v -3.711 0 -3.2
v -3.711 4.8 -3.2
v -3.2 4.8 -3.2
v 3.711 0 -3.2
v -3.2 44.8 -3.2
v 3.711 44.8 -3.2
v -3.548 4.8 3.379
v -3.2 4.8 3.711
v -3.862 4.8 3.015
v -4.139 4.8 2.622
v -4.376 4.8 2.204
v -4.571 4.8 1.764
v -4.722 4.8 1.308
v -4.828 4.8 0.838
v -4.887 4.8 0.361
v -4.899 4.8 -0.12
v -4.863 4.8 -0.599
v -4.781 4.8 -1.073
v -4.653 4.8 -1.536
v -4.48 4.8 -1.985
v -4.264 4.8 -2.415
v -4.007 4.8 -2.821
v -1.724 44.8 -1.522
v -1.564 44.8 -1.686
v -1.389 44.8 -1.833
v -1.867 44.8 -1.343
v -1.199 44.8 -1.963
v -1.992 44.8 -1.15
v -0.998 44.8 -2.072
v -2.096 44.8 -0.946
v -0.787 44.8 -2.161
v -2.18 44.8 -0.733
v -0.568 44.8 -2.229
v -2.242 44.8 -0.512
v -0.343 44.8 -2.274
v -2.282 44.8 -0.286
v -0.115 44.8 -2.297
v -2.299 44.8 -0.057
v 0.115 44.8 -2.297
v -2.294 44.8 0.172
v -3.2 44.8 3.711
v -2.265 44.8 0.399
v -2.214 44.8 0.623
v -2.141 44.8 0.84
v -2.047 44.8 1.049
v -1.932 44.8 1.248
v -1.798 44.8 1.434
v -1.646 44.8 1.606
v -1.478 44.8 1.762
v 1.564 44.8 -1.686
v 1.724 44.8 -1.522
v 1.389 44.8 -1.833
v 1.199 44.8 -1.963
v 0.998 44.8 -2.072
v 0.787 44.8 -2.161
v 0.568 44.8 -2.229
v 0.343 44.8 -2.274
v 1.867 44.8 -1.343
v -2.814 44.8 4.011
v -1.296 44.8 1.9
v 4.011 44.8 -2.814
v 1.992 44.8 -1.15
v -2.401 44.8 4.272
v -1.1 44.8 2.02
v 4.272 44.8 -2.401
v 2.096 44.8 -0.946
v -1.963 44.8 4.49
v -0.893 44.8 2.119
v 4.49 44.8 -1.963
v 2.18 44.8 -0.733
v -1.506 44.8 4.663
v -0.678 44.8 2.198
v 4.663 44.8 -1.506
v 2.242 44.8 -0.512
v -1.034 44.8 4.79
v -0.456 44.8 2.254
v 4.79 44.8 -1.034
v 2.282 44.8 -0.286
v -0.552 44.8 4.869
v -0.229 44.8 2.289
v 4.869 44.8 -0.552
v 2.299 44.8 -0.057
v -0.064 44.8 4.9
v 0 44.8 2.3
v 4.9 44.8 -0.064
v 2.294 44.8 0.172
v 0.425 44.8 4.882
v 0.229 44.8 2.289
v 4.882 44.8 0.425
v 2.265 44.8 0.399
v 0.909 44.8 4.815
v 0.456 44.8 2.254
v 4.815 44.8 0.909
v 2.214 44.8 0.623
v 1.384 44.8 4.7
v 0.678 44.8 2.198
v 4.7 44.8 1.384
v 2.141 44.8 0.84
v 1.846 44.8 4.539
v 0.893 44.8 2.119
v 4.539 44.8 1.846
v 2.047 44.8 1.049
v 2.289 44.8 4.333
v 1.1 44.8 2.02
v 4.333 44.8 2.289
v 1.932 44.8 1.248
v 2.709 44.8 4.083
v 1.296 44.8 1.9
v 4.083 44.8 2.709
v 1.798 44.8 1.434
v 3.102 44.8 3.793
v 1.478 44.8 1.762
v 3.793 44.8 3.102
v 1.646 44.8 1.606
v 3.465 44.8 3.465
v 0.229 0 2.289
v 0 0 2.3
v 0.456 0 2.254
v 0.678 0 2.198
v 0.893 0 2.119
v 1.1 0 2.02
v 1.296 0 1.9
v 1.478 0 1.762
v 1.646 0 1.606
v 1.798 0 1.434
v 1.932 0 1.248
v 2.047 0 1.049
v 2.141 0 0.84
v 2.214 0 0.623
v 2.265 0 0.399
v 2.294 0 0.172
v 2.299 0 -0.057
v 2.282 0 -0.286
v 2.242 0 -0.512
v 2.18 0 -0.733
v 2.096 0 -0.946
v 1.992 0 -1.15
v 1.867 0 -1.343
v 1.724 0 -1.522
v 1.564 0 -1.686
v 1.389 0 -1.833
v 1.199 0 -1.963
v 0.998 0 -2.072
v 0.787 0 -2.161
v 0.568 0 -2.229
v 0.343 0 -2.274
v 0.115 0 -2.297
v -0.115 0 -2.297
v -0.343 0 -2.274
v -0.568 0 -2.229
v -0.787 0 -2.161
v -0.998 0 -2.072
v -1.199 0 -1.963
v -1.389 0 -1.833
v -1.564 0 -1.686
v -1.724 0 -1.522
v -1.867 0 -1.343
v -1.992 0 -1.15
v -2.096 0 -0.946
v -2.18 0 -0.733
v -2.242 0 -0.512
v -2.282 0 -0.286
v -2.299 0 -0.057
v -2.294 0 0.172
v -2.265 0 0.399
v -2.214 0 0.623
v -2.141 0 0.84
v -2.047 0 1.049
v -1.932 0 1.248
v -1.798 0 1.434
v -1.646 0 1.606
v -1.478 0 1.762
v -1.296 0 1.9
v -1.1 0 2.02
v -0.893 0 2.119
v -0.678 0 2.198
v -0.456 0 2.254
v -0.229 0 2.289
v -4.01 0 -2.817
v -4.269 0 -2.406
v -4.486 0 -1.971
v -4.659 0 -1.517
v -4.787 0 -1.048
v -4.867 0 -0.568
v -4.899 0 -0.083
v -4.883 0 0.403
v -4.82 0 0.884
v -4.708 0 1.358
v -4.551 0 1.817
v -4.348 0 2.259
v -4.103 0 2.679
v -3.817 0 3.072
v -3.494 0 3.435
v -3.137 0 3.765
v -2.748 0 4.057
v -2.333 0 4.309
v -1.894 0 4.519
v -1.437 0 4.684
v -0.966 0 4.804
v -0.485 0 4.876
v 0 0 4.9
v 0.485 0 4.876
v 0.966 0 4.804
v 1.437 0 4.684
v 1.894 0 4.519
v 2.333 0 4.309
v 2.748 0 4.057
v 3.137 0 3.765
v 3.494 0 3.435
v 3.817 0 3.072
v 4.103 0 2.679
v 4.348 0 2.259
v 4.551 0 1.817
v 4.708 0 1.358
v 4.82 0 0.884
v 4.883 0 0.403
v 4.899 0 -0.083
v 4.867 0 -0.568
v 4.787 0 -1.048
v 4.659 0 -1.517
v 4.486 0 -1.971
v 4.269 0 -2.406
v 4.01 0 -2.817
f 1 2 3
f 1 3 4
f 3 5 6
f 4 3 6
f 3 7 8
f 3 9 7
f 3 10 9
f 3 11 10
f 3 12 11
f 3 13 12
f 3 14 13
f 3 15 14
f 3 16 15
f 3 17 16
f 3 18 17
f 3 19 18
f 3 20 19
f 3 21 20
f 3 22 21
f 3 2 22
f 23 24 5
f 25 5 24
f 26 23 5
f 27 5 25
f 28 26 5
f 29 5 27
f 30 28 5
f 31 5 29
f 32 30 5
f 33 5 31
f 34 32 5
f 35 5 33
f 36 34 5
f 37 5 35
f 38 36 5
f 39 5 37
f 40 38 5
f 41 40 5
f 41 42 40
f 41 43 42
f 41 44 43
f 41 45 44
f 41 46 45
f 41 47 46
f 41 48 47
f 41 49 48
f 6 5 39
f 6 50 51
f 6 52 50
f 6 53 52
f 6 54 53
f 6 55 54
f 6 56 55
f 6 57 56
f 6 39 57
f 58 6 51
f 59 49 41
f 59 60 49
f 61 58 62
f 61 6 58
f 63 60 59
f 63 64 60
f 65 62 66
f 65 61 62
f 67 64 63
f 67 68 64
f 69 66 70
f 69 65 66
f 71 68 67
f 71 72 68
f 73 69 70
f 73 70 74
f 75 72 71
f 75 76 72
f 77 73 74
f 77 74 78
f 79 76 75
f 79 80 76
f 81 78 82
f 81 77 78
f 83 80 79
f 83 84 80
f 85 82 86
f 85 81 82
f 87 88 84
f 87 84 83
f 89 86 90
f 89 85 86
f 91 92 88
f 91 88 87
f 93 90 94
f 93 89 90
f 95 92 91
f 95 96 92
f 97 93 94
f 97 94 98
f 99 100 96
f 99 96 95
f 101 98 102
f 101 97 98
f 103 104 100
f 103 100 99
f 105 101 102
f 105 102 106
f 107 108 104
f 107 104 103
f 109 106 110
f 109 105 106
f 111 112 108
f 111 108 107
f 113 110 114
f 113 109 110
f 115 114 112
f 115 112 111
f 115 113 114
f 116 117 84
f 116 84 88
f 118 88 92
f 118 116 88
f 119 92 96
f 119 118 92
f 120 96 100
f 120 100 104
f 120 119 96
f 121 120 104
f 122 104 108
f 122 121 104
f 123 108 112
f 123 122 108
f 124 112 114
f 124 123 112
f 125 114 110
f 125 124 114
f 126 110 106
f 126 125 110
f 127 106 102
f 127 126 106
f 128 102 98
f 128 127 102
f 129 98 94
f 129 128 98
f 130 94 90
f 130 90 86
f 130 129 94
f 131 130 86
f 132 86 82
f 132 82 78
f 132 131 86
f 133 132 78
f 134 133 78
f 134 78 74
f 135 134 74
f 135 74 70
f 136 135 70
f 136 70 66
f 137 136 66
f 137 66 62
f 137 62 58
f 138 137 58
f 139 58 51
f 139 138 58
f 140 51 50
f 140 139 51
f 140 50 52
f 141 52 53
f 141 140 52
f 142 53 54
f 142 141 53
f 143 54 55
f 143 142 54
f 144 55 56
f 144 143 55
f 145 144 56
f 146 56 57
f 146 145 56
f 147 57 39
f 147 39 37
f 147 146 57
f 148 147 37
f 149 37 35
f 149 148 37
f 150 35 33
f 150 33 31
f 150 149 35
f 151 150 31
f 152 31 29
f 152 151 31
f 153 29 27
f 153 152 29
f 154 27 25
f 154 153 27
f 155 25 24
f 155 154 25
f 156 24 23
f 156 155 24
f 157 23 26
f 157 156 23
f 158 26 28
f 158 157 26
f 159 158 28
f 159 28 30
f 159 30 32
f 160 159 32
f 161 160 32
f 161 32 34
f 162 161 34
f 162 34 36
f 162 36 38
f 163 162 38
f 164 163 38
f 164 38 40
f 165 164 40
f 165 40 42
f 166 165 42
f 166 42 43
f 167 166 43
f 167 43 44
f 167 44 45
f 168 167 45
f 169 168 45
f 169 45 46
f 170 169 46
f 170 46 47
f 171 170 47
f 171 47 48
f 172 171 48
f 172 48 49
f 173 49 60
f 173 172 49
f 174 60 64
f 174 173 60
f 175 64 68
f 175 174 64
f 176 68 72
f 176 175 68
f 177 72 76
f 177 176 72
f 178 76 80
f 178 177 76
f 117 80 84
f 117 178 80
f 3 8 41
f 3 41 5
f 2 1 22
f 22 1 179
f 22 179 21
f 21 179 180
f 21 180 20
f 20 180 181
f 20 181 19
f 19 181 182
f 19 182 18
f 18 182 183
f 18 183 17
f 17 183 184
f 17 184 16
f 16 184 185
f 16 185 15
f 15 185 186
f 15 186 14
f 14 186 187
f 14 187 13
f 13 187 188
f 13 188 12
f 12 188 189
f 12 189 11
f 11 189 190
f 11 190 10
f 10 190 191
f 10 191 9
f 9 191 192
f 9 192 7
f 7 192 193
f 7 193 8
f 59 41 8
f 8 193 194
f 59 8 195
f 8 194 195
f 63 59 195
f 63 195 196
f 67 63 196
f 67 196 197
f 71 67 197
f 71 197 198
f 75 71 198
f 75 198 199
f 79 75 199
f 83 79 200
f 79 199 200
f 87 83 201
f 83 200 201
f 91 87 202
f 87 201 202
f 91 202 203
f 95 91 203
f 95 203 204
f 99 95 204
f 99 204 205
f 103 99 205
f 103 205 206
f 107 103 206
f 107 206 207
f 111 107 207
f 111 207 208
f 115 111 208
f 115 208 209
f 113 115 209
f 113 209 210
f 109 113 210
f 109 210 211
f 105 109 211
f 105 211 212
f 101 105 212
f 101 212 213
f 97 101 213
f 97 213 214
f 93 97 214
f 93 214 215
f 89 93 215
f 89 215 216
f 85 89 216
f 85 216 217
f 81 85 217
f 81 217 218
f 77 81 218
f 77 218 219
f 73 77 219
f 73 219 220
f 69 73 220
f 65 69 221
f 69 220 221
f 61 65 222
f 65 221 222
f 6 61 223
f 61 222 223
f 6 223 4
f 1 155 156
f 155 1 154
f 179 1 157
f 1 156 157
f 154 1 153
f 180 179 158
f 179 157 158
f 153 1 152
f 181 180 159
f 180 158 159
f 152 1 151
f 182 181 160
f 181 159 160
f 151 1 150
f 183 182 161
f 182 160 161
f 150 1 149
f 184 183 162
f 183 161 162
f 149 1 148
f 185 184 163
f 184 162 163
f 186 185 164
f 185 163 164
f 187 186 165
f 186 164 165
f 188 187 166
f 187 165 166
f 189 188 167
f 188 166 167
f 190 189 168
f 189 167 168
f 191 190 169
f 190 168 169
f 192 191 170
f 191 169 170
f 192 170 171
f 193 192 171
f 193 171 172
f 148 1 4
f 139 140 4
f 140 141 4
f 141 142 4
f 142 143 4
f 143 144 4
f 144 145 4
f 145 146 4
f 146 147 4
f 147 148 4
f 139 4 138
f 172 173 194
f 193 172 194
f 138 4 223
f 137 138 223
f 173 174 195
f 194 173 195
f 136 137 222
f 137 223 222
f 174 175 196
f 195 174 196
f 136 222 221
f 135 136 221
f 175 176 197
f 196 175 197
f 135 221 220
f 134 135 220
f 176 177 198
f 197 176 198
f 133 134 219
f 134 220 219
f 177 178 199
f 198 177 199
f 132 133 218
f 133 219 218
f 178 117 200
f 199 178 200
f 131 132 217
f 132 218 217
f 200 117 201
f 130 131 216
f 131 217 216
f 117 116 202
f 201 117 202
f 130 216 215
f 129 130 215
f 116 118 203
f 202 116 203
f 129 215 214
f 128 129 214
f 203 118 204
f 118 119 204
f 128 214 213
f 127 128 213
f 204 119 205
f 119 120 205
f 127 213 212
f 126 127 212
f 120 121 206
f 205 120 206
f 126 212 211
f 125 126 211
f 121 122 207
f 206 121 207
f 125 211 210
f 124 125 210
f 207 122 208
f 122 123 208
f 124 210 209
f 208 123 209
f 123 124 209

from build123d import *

# Parameters (mm, degrees)
SKETCH1_R           = 4.9
SKETCH1_R_2         = 2.3
BOSS_EXTRUDE1_DEPTH = 44.8
SKETCH2_W           = 12.911728521
SKETCH2_H           = 2.871421643
CUT_EXTRUDE1_DEPTH  = 45
SKETCH3_W           = 17.671201811
SKETCH3_H           = 20
CUT_EXTRUDE2_DEPTH  = 40


with BuildPart() as part:
    # Sketch1 → Boss-Extrude1 (new body)
    with BuildSketch(Plane(origin=(0, 0, 0), x_dir=(1, 0, 0), z_dir=(0, 1, 0))):
        with Locations(Location((0, 0, 0), (0, 0, 270))):
            Circle(SKETCH1_R)
        with Locations(Location((0, 0, 0), (0, 0, 270))):
            Circle(SKETCH1_R_2, mode=Mode.SUBTRACT)
    extrude(amount=BOSS_EXTRUDE1_DEPTH)

    # Sketch2 → Cut-Extrude1 (cut)
    with BuildSketch(Plane(origin=(0, 44.8, 0), x_dir=(1, 0, 0), z_dir=(0, 1, 0))):
        with Locations((0.901888867, 4.635710822)):
            Rectangle(SKETCH2_W, SKETCH2_H)
    extrude(amount=-CUT_EXTRUDE1_DEPTH, mode=Mode.SUBTRACT)

    # Sketch3 → Cut-Extrude2 (cut)
    with BuildSketch(Plane(origin=(0, 44.8, 0), x_dir=(1, 0, 0), z_dir=(0, 1, 0))):
        with Locations((-12.035600906, 4.200665125)):
            Rectangle(SKETCH3_W, SKETCH3_H)
    extrude(amount=-CUT_EXTRUDE2_DEPTH, mode=Mode.SUBTRACT)


solid = part.part
